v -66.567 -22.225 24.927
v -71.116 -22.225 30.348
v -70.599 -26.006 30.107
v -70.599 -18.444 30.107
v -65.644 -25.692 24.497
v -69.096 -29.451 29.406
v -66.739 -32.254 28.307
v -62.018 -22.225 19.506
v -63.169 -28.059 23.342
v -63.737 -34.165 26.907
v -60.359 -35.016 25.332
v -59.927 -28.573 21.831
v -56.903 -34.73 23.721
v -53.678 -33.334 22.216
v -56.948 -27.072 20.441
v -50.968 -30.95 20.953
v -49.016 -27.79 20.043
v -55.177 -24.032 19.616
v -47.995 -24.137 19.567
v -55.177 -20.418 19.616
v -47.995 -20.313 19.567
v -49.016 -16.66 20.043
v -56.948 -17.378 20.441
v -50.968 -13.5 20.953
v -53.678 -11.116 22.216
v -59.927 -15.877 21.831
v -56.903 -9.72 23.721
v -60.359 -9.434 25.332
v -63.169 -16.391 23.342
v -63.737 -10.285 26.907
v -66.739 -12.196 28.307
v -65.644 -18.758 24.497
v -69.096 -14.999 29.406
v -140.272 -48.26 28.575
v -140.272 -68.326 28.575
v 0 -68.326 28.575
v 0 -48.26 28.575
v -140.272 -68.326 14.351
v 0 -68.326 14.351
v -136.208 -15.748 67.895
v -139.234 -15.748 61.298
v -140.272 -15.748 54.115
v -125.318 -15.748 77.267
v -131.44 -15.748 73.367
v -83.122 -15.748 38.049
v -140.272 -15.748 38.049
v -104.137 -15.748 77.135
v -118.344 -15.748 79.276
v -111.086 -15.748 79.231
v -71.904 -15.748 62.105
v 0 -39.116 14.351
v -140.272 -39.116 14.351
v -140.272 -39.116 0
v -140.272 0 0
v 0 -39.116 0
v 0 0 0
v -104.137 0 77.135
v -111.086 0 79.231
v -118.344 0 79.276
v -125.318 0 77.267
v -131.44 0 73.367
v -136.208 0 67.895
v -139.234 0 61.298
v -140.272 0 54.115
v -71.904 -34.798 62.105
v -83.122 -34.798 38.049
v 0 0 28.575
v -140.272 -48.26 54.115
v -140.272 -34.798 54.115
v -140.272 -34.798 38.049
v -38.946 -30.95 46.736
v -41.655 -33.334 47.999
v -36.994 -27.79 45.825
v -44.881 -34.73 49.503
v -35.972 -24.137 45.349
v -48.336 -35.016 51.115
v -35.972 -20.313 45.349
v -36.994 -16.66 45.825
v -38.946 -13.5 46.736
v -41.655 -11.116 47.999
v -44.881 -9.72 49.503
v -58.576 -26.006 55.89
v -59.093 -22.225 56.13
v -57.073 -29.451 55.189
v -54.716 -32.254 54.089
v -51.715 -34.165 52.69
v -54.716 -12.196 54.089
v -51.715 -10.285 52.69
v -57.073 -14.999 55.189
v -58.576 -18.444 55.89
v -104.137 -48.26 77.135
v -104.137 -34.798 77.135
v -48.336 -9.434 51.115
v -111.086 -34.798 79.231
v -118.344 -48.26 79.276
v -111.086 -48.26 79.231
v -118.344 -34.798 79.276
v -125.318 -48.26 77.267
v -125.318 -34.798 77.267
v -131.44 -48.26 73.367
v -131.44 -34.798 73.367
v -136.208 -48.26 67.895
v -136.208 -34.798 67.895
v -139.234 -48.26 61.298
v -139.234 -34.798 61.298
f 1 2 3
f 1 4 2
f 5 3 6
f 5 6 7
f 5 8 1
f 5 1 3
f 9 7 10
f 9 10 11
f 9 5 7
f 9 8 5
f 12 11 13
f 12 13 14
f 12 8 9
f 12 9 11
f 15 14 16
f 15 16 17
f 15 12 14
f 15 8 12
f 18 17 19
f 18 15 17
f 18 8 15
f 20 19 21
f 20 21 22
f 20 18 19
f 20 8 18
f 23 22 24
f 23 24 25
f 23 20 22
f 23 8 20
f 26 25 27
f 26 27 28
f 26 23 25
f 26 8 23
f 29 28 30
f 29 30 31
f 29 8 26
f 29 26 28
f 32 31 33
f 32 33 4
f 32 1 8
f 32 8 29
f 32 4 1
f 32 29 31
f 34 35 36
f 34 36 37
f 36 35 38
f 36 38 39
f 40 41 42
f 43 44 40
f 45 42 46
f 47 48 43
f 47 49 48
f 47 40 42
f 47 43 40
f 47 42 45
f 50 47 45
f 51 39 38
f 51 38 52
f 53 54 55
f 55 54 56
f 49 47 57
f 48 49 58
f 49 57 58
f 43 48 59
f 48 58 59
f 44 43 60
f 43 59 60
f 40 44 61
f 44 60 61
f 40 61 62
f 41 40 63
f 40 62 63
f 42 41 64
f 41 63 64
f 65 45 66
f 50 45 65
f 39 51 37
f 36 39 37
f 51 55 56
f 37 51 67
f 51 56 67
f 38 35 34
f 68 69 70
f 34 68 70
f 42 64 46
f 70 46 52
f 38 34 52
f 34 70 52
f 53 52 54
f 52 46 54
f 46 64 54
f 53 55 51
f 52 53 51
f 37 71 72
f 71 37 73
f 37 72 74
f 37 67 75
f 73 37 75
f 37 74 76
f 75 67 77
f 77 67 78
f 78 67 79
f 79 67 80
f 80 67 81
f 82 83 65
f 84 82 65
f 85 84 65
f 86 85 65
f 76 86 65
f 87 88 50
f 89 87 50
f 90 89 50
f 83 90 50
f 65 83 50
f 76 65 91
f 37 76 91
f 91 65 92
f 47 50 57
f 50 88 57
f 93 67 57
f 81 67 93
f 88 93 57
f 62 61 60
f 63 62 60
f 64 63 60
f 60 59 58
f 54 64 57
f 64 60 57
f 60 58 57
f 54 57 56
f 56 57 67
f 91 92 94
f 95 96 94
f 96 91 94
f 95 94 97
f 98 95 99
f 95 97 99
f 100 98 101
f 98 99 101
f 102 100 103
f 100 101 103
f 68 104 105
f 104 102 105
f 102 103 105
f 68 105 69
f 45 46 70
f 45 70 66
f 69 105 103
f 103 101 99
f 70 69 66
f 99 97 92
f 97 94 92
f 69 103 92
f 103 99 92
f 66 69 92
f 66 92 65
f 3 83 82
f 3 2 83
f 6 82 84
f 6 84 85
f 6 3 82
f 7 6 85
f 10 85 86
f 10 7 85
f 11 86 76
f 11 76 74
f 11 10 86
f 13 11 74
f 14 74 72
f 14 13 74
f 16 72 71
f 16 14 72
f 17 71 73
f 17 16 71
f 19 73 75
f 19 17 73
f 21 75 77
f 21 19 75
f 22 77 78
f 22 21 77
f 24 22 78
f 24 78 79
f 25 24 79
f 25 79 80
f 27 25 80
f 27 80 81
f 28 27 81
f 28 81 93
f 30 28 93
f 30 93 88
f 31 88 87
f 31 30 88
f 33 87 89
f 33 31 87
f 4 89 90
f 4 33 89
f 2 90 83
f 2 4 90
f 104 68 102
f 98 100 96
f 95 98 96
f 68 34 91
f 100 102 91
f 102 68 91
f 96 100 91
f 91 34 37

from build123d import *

# Parameters (mm, degrees)
F1_DEPTH = 68.326
F2_W     = 29.21
F2_H     = 14.351
F2_W_2   = 20.066
F2_H_2   = 51.054
F3_DEPTH = 140.2725
F9_DEPTH = 19.05


with BuildPart() as f1:
    # F0 (on Front) → F1 (new body)
    with BuildSketch(Plane.XZ):
        with BuildLine():
            Line((-140.2715, 0), (0, 0))
            Line((0, 0), (0, 28.575))
            Line((0, 28.575), (-104.1369961518, 77.1348788028))
            ThreePointArc((-104.1369961518, 77.1348788028), (-128.518910052, 75.5368037358), (-140.2715, 54.1146610121))
            Line((-140.2715, 54.1146610121), (-140.2715, 0))
        make_face()
    extrude(amount=F1_DEPTH)

    # F2 (on face) → F3 (cut, through all)
    with BuildSketch(Plane.YZ):
        with Locations((-53.721, 7.1755)):
            Rectangle(F2_W, F2_H)
        with Locations((-58.293, 54.102)):
            Rectangle(F2_W_2, F2_H_2)
    extrude(amount=-F3_DEPTH, mode=Mode.SUBTRACT)

    # F5 (on offset) → F6 (revolve, cut)
    with BuildSketch(Plane.XZ.offset(22.225)):
        Polygon((-71.1155433788, 30.3478274527), (-62.0181519767, 19.5059785661), (-47.4676890845, 50.709546935), (-59.0928990688, 56.1304713784), align=None)
    revolve(axis=Axis((-54.7429205306, -22.225, 35.1077627505), (0.4226182617, 0, 0.906307787)), mode=Mode.SUBTRACT)

    # F8 (on offset) → F9 (cut)
    with BuildSketch(Plane.XZ.offset(15.748)):
        Polygon((-140.2715, 82.0435324035), (-140.2715, 38.0492), (-83.1215, 38.0492), (-71.9043142808, 62.1045324035), (-71.9043142808, 82.0435324035), align=None)
    extrude(amount=F9_DEPTH, mode=Mode.SUBTRACT)


solid = f1.part
